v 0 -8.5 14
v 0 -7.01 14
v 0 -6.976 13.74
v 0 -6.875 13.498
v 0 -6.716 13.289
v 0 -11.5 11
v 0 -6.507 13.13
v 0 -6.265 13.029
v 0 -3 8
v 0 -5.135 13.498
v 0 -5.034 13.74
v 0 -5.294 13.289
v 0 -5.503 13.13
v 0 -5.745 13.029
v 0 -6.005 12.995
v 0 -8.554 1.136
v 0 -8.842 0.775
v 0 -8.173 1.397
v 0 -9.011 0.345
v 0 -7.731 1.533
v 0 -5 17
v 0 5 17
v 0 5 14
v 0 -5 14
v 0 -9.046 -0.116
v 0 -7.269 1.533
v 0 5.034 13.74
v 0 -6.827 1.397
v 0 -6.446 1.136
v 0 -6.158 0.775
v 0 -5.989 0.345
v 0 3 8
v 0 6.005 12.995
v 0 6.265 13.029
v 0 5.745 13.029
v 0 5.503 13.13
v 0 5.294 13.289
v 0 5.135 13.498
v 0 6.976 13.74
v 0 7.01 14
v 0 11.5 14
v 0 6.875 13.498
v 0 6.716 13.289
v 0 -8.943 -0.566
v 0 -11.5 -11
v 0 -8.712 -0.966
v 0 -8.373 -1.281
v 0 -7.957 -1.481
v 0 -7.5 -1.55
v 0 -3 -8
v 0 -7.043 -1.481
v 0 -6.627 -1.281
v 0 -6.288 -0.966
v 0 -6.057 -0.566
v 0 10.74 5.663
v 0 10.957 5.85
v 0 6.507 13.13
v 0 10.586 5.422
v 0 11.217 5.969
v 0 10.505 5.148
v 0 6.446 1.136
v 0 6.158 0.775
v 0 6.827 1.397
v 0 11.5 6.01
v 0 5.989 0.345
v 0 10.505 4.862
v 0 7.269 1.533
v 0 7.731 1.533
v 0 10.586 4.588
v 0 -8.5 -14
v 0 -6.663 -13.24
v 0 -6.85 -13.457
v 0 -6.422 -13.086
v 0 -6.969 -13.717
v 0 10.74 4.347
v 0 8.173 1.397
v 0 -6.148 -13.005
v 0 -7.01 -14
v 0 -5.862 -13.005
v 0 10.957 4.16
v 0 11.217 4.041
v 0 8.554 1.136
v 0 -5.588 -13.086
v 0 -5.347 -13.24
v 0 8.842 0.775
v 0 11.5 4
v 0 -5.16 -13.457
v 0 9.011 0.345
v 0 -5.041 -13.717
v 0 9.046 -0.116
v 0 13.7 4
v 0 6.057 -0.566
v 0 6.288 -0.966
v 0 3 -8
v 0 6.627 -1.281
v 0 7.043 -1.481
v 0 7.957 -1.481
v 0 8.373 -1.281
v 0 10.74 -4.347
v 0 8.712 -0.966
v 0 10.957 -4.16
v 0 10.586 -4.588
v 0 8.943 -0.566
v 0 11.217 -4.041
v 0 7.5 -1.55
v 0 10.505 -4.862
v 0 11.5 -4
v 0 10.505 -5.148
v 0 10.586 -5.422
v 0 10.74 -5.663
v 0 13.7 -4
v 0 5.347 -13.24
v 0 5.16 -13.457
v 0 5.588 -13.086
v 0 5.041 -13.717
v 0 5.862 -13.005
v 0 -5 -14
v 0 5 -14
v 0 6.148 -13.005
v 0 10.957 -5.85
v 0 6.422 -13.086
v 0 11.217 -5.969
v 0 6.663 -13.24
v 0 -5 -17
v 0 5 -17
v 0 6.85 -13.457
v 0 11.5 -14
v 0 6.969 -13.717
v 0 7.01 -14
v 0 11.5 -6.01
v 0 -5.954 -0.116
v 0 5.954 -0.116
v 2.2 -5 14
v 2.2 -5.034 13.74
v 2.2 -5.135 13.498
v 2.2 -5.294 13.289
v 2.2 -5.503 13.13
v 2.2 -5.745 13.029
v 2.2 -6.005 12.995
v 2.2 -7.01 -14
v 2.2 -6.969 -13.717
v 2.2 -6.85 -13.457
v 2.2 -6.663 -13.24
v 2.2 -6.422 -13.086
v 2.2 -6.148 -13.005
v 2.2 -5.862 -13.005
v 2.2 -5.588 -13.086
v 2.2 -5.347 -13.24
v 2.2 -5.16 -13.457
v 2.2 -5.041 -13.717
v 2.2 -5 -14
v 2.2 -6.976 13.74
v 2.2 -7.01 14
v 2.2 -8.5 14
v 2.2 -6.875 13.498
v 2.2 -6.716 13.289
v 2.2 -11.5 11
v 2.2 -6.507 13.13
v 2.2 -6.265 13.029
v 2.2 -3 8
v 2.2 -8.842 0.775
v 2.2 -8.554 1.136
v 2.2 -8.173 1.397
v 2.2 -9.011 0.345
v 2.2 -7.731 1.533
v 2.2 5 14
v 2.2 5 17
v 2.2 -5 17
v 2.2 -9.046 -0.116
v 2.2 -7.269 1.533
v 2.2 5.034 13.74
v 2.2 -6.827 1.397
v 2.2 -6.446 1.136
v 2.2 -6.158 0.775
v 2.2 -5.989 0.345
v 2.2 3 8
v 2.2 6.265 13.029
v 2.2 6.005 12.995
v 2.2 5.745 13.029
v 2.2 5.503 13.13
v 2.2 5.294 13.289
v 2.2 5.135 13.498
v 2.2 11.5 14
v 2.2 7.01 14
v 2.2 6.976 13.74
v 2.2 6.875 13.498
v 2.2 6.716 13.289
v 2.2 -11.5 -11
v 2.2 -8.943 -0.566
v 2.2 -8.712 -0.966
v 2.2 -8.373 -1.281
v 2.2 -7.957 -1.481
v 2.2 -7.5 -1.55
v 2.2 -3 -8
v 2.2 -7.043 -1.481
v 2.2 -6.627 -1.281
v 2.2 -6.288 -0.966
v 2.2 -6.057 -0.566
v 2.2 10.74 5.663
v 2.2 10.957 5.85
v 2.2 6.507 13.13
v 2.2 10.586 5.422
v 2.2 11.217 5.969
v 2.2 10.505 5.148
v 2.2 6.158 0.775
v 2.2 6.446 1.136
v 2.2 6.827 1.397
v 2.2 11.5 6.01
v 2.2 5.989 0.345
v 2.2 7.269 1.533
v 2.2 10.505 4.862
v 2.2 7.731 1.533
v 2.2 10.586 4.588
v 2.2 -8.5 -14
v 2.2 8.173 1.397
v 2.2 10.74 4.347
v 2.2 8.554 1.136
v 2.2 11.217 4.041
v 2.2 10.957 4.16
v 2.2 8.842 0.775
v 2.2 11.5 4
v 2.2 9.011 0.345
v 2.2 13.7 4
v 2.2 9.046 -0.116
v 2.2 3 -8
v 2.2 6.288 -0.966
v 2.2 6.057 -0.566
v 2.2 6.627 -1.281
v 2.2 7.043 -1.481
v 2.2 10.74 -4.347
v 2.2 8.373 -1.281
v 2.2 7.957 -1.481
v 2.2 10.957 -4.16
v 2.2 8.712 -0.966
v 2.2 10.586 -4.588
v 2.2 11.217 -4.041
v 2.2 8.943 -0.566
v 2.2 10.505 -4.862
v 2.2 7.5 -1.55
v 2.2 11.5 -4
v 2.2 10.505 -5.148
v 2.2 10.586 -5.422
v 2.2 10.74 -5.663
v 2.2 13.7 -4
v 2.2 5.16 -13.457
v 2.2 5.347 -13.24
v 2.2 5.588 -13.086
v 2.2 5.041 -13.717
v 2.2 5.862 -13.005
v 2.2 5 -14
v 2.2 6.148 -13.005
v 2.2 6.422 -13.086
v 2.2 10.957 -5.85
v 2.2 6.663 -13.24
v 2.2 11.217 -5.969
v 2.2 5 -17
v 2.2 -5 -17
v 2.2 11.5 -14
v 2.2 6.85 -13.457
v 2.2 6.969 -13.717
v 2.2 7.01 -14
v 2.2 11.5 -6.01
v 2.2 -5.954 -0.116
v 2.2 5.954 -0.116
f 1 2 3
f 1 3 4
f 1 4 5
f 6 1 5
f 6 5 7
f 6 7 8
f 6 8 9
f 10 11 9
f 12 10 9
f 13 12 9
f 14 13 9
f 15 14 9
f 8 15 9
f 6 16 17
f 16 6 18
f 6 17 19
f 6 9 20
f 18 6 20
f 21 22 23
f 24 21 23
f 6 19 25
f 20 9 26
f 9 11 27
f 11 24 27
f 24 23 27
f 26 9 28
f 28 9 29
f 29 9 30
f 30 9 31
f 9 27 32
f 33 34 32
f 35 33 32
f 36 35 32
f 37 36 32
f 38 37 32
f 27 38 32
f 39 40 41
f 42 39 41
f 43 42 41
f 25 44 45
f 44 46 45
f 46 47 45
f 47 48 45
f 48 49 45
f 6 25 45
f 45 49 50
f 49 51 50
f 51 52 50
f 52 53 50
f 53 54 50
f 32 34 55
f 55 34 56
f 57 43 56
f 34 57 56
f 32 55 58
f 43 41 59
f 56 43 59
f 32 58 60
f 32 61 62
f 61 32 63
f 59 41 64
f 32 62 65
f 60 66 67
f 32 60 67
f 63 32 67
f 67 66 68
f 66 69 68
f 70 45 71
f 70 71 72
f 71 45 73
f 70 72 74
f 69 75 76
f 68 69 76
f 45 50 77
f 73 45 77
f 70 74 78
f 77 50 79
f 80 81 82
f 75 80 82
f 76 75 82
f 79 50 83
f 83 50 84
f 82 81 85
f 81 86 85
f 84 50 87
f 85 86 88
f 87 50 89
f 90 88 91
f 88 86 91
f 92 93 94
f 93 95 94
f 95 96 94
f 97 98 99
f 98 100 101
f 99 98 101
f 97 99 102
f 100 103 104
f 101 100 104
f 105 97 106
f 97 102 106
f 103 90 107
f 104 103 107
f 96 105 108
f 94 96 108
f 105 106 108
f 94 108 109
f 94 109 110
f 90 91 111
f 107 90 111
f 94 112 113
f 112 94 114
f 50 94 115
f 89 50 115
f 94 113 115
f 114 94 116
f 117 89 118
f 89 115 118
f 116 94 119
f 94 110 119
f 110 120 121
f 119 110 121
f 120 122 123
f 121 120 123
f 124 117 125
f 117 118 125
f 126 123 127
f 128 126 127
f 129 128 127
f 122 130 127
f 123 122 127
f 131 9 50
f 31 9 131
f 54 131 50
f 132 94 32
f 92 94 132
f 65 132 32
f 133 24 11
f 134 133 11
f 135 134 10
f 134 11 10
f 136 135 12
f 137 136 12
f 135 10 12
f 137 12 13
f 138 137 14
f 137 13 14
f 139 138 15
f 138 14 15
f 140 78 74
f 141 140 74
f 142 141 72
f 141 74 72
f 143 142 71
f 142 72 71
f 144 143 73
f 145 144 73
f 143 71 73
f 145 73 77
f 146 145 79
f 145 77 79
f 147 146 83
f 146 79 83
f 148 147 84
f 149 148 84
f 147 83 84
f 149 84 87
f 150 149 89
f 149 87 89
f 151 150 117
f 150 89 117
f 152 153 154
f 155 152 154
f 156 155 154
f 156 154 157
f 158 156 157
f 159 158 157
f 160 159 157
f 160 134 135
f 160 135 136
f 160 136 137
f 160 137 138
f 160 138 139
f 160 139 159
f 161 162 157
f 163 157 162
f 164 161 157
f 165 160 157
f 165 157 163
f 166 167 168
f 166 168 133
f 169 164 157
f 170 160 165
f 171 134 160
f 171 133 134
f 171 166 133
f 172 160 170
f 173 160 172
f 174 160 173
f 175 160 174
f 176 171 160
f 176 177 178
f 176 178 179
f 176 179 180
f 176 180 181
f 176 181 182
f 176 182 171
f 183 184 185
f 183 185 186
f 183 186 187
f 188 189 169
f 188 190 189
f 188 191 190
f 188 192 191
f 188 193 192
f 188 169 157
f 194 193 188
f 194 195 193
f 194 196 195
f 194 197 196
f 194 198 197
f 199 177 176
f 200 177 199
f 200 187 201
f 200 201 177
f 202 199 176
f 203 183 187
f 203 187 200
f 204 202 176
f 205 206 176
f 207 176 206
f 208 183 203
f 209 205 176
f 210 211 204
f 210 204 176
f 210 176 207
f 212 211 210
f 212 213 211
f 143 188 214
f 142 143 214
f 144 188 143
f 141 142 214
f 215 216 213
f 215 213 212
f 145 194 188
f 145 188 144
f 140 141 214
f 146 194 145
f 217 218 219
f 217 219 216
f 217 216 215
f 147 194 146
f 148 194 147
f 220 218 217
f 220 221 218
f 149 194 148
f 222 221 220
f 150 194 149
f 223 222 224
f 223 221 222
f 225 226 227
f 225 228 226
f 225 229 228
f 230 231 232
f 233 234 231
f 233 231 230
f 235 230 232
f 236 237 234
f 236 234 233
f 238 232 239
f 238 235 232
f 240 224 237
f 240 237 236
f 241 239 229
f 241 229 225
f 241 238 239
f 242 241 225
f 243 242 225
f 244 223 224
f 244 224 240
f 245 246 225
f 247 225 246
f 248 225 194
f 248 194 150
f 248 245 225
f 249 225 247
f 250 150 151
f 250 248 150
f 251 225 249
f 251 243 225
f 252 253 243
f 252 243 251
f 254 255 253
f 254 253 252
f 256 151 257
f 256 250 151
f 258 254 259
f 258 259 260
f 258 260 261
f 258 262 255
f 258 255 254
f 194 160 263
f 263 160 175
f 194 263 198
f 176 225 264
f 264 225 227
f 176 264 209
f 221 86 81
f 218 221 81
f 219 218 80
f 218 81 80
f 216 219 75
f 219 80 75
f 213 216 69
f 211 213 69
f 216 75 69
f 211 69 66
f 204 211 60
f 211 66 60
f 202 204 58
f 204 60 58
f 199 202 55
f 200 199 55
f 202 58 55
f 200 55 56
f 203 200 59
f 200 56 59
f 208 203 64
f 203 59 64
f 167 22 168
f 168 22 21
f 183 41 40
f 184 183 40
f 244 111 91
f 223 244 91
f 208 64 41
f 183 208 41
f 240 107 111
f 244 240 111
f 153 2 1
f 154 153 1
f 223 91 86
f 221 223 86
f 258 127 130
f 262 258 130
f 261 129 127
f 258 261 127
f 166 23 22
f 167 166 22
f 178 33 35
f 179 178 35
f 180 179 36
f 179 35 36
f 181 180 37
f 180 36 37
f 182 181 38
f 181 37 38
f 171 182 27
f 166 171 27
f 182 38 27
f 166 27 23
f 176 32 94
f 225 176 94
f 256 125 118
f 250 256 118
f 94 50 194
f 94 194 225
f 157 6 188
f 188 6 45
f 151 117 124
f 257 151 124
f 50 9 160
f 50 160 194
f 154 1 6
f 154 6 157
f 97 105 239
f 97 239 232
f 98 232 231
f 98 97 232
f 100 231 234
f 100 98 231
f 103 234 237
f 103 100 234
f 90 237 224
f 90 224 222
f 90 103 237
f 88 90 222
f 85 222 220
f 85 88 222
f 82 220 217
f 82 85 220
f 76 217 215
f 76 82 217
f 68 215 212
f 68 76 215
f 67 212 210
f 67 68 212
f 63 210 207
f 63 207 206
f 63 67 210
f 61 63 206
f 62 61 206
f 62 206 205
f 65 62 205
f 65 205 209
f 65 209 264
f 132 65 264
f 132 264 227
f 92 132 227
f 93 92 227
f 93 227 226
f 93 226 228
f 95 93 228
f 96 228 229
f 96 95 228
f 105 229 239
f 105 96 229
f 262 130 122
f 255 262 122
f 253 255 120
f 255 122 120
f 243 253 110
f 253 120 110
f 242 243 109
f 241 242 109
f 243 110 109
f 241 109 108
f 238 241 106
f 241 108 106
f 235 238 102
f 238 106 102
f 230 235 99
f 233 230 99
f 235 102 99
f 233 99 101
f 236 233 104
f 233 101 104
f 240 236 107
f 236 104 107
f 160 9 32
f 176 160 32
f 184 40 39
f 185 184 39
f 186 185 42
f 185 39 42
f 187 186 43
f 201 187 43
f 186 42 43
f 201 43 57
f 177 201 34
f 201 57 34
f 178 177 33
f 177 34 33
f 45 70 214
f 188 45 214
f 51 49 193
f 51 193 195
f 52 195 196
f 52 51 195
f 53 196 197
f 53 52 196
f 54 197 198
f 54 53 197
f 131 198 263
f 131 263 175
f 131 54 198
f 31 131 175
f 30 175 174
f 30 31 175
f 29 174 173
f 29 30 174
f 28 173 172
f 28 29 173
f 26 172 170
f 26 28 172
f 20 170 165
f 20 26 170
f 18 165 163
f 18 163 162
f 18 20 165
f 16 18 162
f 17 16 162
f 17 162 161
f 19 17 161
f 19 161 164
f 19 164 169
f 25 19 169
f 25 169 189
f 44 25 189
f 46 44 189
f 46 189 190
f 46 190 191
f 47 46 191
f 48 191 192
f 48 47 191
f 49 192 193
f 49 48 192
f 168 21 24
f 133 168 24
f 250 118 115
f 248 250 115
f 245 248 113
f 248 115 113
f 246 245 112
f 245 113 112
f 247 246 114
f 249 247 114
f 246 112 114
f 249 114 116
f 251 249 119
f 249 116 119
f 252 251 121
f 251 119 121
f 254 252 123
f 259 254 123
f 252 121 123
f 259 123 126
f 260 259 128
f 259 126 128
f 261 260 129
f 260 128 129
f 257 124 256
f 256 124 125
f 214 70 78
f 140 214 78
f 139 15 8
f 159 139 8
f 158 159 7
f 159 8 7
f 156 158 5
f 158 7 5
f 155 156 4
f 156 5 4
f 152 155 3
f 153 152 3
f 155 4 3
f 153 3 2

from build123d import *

# Parameters (mm, degrees)
SKETCH_1_R      = 1.55
SKETCH_1_W      = 16
SKETCH_1_H      = 6
EXTRUDE_1_DEPTH = 2.2
CHAMFER_1_SIZE  = 3


with BuildPart() as part:
    # 草图1 → 凸台-拉伸1 (new body)
    with BuildSketch(Plane(origin=(0, 0, 0), x_dir=(0, 0, -1), z_dir=(1, 0, 0))):
        with BuildLine():
            Line((-14, -11.5), (14, -11.5))
            Line((14, -11.5), (14, -7.01))
            ThreePointArc((14, -7.01), (12.995, -6.005), (14, -5))
            Line((14, -5), (17, -5))
            Line((17, -5), (17, 5))
            Line((17, 5), (14, 5))
            ThreePointArc((14, 5), (12.995, 6.005), (14, 7.01))
            Line((14, 7.01), (14, 11.5))
            Line((14, 11.5), (6.01, 11.5))
            ThreePointArc((6.01, 11.5), (5.005, 10.495), (4, 11.5))
            Line((4, 11.5), (4, 13.7))
            Line((4, 13.7), (-4, 13.7))
            Line((-4, 13.7), (-4, 11.5))
            ThreePointArc((-4, 11.5), (-5.005, 10.495), (-6.01, 11.5))
            Line((-6.01, 11.5), (-14, 11.5))
            Line((-14, 11.5), (-14, 7.01))
            ThreePointArc((-14, 7.01), (-13.289357685, 6.715642315), (-12.995, 6.005))
            ThreePointArc((-12.995, 6.005), (-13.289357685, 5.294357685), (-14, 5))
            Line((-14, 5), (-17, 5))
            Line((-17, 5), (-17, -5))
            Line((-17, -5), (-14, -5))
            ThreePointArc((-14, -5), (-13.289357685, -5.294357685), (-12.995, -6.005))
            ThreePointArc((-12.995, -6.005), (-13.289357685, -6.715642315), (-14, -7.01))
            Line((-14, -7.01), (-14, -11.5))
        make_face()
        with Locations((0, -7.5)):
            Circle(SKETCH_1_R, mode=Mode.SUBTRACT)
        Rectangle(SKETCH_1_W, SKETCH_1_H, mode=Mode.SUBTRACT)
        with Locations((0, 7.5)):
            Circle(SKETCH_1_R, mode=Mode.SUBTRACT)
    extrude(amount=EXTRUDE_1_DEPTH)

    # 倒角1
    chamfer_1_edges = [part.edges().sort_by_distance(p)[0] for p in [
        (1.1, -11.5, -14),
        (1.1, -11.5, 14),
    ]]
    chamfer(chamfer_1_edges, length=CHAMFER_1_SIZE)


solid = part.part
